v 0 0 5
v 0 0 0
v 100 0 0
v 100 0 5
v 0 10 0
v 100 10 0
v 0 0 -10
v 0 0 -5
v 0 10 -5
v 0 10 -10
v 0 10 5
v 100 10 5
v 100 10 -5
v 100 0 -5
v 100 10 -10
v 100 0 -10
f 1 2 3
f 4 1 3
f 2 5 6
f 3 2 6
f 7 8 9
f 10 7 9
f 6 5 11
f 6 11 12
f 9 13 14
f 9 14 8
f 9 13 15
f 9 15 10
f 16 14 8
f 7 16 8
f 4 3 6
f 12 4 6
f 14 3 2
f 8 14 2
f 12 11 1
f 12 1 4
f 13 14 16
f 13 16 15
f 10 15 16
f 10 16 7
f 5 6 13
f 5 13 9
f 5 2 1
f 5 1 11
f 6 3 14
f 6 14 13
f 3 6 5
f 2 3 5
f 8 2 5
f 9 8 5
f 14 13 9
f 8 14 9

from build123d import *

# Parameters (mm, degrees)
SKETCH_1_W      = 100
SKETCH_1_H      = 10
EXTRUDE_1_DEPTH = 5
SKETCH_4_W      = 100
SKETCH_4_H      = 10
EXTRUDE_3_DEPTH = 5
SKETCH_5_W      = 100
SKETCH_5_H      = 10
EXTRUDE_4_DEPTH = 5


with BuildPart() as part:
    # ｽｹｯﾁ1 → ﾎﾞｽ - 押し出し1 (new body)
    with BuildSketch(Plane.XY):
        with Locations((50, 5)):
            Rectangle(SKETCH_1_W, SKETCH_1_H)
    extrude(amount=EXTRUDE_1_DEPTH)


with BuildPart() as body_2:
    # ｽｹｯﾁ4 → ﾎﾞｽ - 押し出し3 (new body)
    with BuildSketch(Plane(origin=(0, 0, 0), x_dir=(-1, 0, 0), z_dir=(0, 0, -1))):
        with Locations((-50, 5)):
            Rectangle(SKETCH_4_W, SKETCH_4_H)
    extrude(amount=EXTRUDE_3_DEPTH)


with BuildPart() as body_3:
    # ｽｹｯﾁ5 → ﾎﾞｽ - 押し出し4 (new body)
    with BuildSketch(Plane(origin=(0, 0, -5), x_dir=(-1, 0, 0), z_dir=(0, 0, -1))):
        with Locations((-50, 5)):
            Rectangle(SKETCH_5_W, SKETCH_5_H)
    extrude(amount=EXTRUDE_4_DEPTH)


solid = Compound([part.part, body_2.part, body_3.part])
